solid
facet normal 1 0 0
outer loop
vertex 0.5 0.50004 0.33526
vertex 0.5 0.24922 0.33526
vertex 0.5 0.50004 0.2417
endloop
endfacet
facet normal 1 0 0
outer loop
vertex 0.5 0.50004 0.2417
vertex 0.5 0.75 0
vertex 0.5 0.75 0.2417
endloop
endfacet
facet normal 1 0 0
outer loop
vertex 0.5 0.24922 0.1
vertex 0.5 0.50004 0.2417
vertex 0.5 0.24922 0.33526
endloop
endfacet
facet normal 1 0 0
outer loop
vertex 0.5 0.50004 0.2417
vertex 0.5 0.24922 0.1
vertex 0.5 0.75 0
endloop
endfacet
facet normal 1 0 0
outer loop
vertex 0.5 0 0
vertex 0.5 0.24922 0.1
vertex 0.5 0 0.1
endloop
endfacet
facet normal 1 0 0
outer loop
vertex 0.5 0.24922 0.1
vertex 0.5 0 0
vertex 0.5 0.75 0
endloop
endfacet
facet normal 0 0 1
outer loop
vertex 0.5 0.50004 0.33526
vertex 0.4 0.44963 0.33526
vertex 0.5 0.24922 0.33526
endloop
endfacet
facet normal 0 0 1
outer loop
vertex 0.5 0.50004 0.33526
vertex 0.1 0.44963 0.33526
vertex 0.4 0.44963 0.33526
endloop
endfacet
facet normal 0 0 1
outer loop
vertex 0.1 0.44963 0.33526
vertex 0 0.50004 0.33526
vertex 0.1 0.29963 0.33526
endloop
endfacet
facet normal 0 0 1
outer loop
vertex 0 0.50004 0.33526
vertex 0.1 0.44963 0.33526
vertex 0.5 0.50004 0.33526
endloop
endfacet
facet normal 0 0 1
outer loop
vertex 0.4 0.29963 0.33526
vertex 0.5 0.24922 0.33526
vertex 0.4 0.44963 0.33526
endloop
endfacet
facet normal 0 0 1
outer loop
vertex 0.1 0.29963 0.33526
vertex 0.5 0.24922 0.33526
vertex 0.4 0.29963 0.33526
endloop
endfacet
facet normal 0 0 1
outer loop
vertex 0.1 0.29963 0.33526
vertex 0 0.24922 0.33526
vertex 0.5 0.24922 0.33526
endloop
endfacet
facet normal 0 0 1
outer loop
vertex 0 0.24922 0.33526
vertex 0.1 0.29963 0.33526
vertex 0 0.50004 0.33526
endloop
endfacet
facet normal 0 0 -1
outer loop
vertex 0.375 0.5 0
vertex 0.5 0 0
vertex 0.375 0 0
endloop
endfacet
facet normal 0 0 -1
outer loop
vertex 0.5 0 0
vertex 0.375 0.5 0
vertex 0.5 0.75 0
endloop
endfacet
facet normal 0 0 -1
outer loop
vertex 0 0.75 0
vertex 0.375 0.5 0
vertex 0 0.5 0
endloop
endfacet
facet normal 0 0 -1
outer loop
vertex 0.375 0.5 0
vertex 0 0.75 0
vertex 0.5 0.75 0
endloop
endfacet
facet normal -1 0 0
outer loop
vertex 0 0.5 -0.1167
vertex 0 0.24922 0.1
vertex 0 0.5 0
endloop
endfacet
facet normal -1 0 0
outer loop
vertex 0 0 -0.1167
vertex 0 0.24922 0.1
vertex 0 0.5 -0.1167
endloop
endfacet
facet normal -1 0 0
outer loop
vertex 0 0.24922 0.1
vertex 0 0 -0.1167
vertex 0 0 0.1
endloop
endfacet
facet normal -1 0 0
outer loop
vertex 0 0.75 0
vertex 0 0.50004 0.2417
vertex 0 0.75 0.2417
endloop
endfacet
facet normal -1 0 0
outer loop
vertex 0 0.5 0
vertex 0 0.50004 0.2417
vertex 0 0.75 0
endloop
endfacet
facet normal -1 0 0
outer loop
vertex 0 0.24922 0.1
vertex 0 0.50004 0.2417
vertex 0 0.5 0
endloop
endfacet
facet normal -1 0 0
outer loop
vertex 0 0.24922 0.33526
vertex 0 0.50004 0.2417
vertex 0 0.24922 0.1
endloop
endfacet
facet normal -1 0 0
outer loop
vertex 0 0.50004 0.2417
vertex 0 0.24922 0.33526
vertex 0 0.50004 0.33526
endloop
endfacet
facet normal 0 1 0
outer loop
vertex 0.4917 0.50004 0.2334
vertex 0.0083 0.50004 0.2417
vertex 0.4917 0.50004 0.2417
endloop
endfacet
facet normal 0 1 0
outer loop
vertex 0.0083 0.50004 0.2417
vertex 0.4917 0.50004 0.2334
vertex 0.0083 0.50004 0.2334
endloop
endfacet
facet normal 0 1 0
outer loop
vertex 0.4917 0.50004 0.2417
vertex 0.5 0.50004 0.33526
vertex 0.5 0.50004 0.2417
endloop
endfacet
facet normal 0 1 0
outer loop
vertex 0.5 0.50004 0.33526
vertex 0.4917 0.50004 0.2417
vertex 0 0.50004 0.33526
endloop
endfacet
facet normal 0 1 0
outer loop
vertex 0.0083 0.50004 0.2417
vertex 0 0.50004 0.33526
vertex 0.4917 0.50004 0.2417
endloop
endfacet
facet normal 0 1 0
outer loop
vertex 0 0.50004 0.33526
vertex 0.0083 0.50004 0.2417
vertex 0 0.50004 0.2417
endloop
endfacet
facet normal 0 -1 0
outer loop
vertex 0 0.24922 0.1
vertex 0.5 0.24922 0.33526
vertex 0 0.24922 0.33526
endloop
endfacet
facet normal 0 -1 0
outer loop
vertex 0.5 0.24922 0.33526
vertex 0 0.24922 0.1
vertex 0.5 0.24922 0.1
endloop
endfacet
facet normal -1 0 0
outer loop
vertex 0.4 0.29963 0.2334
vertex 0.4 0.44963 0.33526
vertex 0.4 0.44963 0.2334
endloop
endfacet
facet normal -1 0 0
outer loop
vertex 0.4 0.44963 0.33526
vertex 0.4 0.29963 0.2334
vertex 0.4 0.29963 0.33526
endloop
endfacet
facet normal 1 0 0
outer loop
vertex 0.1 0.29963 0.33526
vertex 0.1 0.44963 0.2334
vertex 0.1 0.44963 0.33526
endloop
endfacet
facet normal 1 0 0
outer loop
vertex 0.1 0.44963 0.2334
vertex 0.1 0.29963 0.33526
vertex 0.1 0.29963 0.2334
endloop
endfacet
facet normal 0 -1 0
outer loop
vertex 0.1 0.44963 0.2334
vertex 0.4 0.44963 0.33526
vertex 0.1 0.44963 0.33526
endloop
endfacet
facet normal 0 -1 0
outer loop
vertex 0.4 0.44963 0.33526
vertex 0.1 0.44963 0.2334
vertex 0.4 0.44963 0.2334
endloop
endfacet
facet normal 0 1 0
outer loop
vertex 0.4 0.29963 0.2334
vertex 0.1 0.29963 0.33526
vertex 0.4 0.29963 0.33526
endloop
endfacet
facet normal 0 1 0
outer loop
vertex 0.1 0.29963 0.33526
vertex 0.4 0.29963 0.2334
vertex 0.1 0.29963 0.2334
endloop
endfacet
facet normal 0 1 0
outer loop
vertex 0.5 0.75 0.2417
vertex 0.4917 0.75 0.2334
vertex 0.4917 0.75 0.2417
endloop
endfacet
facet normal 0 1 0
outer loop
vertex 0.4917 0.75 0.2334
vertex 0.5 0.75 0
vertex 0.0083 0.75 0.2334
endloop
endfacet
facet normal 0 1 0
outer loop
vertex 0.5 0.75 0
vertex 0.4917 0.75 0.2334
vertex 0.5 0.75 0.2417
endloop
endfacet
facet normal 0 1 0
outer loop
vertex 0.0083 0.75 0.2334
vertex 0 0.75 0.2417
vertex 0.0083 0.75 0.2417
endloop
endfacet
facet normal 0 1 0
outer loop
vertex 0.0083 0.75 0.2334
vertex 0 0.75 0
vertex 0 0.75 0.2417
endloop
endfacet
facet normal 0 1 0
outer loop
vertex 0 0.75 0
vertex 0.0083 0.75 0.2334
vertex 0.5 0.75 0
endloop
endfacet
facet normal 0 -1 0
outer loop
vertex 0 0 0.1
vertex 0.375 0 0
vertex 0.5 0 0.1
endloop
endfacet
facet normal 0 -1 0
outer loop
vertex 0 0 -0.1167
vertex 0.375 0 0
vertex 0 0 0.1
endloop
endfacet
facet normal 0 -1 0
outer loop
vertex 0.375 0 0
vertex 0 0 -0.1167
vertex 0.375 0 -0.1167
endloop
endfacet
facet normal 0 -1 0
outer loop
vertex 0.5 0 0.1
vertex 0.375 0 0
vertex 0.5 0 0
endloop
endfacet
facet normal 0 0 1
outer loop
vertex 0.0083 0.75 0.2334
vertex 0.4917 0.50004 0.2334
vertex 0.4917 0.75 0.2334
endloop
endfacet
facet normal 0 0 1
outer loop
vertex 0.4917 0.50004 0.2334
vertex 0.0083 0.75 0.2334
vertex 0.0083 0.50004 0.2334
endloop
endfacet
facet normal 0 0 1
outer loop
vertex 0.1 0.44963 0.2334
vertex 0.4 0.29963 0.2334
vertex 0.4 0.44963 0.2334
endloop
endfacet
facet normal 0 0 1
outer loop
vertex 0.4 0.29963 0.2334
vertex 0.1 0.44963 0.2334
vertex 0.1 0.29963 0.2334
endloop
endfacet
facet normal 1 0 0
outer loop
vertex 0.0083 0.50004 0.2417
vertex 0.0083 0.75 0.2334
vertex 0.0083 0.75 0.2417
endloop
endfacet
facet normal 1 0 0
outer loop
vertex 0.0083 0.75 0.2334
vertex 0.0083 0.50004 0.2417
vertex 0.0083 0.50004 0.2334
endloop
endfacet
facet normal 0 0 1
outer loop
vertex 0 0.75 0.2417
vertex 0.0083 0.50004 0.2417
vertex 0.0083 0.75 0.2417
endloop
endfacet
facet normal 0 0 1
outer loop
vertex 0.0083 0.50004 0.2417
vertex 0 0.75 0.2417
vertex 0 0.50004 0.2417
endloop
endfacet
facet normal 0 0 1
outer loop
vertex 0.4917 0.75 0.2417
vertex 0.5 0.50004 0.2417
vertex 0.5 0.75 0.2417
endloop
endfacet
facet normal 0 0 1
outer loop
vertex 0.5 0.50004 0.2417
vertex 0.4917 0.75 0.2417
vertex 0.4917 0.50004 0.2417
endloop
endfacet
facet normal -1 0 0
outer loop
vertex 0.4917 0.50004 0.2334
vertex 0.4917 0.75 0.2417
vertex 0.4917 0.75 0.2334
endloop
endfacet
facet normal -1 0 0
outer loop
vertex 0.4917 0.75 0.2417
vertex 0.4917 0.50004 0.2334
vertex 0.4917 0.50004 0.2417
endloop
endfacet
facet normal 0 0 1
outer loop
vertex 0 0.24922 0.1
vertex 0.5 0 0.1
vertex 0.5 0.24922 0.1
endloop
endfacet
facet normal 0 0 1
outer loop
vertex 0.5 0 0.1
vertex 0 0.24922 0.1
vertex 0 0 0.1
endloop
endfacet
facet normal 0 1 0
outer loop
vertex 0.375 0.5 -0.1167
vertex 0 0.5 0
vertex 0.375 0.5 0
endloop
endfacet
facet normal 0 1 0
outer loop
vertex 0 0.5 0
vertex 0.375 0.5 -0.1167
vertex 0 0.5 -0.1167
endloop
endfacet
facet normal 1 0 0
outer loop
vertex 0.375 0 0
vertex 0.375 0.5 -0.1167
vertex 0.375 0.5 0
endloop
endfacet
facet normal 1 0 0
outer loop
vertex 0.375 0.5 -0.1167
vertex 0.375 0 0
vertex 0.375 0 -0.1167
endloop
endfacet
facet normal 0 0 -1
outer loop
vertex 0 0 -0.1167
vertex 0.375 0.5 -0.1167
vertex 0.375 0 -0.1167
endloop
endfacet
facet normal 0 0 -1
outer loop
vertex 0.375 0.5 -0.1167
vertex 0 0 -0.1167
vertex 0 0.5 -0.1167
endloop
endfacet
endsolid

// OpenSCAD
// === Main Reference Slab Parameters ===
base_length = 0.5;      // X dimension
base_width = 0.75;      // Y dimension
base_height = 0.016667; // Z dimension (thickness)

// === Upper-Side Block Parameters ===
upper_block_width = 0.5;
upper_block_depth = 0.5;
upper_front_offset = 0.25;
upper_reach = 0.2334;   // Total reach from base datum

// === Edge Strip Parameters ===
strip_width = 0.0083;
strip_length = 0.5;
strip_depth = 0.0083;
strip_front_offset = 0.25;
strip_edge_offset = 0.4917;

// === Transverse Feature Parameters ===
transverse_width = 0.5;
transverse_depth = 0.250819;
transverse_front_offset = 0.24922;
transverse_back_offset = 0.249961;
transverse_thickness = 0.0021;
transverse_reach = 0.335265;

// === Transverse Void Parameters ===
void_width = 0.3;
void_depth = 0.15;

// === Stepped Portion Parameters ===
shallow_depth = 0.1;       // Upper pad depth
deeper_depth = 0.2167;     // Deeper continuation depth
shallow_width = 0.5;
shallow_length = 0.5;
deeper_width = 0.375;      // Contained within shallow footprint
deeper_length = 0.5;

// === Resolution ===
$fn = 100;

// === Main Assembly ===
union() {
    // Step 1: Main reference slab (base)
    cube([base_length, base_width, base_height]);

    // Step 2: Upper-side rectangular feature
    // Flush to left, right, back; offset from front
    translate([0, upper_front_offset, 0])
        cube([upper_block_width, upper_block_depth, upper_reach]);

    // Step 3: Left edge strip
    // Flush with left edge, offset from right
    translate([0, strip_front_offset, upper_reach])
        cube([strip_width, strip_length, strip_depth]);

    // Step 4: Right edge strip
    // Flush with right edge, offset from left
    translate([base_length - strip_width, strip_front_offset, upper_reach])
        cube([strip_width, strip_length, strip_depth]);

    // Step 5: Thin transverse feature with void
    // Flush to left/right, offset from front and back
    difference() {
        // Solid transverse feature
        translate([0, transverse_front_offset, 0])
            cube([transverse_width, transverse_depth, transverse_reach]);

        // Closed internal void profile (rectangular cutout through feature)
        translate([
            (transverse_width - void_width) / 2,
            transverse_front_offset + (transverse_depth - void_depth) / 2,
            -0.001
        ])
            cube([void_width, void_depth, transverse_reach + 0.002]);
    }

    // Step 6: Stepped portion - shallow upper pad
    // Reach measured from base datum
    cube([shallow_width, shallow_length, shallow_depth]);

    // Step 7: Stepped portion - deeper continuation
    // Extends below shoulder; reach measured from same shoulder
    // Shares left, front, back edges with shallow footprint
    translate([0, 0, -(deeper_depth - shallow_depth)])
        cube([deeper_width, deeper_length, deeper_depth]);
}
